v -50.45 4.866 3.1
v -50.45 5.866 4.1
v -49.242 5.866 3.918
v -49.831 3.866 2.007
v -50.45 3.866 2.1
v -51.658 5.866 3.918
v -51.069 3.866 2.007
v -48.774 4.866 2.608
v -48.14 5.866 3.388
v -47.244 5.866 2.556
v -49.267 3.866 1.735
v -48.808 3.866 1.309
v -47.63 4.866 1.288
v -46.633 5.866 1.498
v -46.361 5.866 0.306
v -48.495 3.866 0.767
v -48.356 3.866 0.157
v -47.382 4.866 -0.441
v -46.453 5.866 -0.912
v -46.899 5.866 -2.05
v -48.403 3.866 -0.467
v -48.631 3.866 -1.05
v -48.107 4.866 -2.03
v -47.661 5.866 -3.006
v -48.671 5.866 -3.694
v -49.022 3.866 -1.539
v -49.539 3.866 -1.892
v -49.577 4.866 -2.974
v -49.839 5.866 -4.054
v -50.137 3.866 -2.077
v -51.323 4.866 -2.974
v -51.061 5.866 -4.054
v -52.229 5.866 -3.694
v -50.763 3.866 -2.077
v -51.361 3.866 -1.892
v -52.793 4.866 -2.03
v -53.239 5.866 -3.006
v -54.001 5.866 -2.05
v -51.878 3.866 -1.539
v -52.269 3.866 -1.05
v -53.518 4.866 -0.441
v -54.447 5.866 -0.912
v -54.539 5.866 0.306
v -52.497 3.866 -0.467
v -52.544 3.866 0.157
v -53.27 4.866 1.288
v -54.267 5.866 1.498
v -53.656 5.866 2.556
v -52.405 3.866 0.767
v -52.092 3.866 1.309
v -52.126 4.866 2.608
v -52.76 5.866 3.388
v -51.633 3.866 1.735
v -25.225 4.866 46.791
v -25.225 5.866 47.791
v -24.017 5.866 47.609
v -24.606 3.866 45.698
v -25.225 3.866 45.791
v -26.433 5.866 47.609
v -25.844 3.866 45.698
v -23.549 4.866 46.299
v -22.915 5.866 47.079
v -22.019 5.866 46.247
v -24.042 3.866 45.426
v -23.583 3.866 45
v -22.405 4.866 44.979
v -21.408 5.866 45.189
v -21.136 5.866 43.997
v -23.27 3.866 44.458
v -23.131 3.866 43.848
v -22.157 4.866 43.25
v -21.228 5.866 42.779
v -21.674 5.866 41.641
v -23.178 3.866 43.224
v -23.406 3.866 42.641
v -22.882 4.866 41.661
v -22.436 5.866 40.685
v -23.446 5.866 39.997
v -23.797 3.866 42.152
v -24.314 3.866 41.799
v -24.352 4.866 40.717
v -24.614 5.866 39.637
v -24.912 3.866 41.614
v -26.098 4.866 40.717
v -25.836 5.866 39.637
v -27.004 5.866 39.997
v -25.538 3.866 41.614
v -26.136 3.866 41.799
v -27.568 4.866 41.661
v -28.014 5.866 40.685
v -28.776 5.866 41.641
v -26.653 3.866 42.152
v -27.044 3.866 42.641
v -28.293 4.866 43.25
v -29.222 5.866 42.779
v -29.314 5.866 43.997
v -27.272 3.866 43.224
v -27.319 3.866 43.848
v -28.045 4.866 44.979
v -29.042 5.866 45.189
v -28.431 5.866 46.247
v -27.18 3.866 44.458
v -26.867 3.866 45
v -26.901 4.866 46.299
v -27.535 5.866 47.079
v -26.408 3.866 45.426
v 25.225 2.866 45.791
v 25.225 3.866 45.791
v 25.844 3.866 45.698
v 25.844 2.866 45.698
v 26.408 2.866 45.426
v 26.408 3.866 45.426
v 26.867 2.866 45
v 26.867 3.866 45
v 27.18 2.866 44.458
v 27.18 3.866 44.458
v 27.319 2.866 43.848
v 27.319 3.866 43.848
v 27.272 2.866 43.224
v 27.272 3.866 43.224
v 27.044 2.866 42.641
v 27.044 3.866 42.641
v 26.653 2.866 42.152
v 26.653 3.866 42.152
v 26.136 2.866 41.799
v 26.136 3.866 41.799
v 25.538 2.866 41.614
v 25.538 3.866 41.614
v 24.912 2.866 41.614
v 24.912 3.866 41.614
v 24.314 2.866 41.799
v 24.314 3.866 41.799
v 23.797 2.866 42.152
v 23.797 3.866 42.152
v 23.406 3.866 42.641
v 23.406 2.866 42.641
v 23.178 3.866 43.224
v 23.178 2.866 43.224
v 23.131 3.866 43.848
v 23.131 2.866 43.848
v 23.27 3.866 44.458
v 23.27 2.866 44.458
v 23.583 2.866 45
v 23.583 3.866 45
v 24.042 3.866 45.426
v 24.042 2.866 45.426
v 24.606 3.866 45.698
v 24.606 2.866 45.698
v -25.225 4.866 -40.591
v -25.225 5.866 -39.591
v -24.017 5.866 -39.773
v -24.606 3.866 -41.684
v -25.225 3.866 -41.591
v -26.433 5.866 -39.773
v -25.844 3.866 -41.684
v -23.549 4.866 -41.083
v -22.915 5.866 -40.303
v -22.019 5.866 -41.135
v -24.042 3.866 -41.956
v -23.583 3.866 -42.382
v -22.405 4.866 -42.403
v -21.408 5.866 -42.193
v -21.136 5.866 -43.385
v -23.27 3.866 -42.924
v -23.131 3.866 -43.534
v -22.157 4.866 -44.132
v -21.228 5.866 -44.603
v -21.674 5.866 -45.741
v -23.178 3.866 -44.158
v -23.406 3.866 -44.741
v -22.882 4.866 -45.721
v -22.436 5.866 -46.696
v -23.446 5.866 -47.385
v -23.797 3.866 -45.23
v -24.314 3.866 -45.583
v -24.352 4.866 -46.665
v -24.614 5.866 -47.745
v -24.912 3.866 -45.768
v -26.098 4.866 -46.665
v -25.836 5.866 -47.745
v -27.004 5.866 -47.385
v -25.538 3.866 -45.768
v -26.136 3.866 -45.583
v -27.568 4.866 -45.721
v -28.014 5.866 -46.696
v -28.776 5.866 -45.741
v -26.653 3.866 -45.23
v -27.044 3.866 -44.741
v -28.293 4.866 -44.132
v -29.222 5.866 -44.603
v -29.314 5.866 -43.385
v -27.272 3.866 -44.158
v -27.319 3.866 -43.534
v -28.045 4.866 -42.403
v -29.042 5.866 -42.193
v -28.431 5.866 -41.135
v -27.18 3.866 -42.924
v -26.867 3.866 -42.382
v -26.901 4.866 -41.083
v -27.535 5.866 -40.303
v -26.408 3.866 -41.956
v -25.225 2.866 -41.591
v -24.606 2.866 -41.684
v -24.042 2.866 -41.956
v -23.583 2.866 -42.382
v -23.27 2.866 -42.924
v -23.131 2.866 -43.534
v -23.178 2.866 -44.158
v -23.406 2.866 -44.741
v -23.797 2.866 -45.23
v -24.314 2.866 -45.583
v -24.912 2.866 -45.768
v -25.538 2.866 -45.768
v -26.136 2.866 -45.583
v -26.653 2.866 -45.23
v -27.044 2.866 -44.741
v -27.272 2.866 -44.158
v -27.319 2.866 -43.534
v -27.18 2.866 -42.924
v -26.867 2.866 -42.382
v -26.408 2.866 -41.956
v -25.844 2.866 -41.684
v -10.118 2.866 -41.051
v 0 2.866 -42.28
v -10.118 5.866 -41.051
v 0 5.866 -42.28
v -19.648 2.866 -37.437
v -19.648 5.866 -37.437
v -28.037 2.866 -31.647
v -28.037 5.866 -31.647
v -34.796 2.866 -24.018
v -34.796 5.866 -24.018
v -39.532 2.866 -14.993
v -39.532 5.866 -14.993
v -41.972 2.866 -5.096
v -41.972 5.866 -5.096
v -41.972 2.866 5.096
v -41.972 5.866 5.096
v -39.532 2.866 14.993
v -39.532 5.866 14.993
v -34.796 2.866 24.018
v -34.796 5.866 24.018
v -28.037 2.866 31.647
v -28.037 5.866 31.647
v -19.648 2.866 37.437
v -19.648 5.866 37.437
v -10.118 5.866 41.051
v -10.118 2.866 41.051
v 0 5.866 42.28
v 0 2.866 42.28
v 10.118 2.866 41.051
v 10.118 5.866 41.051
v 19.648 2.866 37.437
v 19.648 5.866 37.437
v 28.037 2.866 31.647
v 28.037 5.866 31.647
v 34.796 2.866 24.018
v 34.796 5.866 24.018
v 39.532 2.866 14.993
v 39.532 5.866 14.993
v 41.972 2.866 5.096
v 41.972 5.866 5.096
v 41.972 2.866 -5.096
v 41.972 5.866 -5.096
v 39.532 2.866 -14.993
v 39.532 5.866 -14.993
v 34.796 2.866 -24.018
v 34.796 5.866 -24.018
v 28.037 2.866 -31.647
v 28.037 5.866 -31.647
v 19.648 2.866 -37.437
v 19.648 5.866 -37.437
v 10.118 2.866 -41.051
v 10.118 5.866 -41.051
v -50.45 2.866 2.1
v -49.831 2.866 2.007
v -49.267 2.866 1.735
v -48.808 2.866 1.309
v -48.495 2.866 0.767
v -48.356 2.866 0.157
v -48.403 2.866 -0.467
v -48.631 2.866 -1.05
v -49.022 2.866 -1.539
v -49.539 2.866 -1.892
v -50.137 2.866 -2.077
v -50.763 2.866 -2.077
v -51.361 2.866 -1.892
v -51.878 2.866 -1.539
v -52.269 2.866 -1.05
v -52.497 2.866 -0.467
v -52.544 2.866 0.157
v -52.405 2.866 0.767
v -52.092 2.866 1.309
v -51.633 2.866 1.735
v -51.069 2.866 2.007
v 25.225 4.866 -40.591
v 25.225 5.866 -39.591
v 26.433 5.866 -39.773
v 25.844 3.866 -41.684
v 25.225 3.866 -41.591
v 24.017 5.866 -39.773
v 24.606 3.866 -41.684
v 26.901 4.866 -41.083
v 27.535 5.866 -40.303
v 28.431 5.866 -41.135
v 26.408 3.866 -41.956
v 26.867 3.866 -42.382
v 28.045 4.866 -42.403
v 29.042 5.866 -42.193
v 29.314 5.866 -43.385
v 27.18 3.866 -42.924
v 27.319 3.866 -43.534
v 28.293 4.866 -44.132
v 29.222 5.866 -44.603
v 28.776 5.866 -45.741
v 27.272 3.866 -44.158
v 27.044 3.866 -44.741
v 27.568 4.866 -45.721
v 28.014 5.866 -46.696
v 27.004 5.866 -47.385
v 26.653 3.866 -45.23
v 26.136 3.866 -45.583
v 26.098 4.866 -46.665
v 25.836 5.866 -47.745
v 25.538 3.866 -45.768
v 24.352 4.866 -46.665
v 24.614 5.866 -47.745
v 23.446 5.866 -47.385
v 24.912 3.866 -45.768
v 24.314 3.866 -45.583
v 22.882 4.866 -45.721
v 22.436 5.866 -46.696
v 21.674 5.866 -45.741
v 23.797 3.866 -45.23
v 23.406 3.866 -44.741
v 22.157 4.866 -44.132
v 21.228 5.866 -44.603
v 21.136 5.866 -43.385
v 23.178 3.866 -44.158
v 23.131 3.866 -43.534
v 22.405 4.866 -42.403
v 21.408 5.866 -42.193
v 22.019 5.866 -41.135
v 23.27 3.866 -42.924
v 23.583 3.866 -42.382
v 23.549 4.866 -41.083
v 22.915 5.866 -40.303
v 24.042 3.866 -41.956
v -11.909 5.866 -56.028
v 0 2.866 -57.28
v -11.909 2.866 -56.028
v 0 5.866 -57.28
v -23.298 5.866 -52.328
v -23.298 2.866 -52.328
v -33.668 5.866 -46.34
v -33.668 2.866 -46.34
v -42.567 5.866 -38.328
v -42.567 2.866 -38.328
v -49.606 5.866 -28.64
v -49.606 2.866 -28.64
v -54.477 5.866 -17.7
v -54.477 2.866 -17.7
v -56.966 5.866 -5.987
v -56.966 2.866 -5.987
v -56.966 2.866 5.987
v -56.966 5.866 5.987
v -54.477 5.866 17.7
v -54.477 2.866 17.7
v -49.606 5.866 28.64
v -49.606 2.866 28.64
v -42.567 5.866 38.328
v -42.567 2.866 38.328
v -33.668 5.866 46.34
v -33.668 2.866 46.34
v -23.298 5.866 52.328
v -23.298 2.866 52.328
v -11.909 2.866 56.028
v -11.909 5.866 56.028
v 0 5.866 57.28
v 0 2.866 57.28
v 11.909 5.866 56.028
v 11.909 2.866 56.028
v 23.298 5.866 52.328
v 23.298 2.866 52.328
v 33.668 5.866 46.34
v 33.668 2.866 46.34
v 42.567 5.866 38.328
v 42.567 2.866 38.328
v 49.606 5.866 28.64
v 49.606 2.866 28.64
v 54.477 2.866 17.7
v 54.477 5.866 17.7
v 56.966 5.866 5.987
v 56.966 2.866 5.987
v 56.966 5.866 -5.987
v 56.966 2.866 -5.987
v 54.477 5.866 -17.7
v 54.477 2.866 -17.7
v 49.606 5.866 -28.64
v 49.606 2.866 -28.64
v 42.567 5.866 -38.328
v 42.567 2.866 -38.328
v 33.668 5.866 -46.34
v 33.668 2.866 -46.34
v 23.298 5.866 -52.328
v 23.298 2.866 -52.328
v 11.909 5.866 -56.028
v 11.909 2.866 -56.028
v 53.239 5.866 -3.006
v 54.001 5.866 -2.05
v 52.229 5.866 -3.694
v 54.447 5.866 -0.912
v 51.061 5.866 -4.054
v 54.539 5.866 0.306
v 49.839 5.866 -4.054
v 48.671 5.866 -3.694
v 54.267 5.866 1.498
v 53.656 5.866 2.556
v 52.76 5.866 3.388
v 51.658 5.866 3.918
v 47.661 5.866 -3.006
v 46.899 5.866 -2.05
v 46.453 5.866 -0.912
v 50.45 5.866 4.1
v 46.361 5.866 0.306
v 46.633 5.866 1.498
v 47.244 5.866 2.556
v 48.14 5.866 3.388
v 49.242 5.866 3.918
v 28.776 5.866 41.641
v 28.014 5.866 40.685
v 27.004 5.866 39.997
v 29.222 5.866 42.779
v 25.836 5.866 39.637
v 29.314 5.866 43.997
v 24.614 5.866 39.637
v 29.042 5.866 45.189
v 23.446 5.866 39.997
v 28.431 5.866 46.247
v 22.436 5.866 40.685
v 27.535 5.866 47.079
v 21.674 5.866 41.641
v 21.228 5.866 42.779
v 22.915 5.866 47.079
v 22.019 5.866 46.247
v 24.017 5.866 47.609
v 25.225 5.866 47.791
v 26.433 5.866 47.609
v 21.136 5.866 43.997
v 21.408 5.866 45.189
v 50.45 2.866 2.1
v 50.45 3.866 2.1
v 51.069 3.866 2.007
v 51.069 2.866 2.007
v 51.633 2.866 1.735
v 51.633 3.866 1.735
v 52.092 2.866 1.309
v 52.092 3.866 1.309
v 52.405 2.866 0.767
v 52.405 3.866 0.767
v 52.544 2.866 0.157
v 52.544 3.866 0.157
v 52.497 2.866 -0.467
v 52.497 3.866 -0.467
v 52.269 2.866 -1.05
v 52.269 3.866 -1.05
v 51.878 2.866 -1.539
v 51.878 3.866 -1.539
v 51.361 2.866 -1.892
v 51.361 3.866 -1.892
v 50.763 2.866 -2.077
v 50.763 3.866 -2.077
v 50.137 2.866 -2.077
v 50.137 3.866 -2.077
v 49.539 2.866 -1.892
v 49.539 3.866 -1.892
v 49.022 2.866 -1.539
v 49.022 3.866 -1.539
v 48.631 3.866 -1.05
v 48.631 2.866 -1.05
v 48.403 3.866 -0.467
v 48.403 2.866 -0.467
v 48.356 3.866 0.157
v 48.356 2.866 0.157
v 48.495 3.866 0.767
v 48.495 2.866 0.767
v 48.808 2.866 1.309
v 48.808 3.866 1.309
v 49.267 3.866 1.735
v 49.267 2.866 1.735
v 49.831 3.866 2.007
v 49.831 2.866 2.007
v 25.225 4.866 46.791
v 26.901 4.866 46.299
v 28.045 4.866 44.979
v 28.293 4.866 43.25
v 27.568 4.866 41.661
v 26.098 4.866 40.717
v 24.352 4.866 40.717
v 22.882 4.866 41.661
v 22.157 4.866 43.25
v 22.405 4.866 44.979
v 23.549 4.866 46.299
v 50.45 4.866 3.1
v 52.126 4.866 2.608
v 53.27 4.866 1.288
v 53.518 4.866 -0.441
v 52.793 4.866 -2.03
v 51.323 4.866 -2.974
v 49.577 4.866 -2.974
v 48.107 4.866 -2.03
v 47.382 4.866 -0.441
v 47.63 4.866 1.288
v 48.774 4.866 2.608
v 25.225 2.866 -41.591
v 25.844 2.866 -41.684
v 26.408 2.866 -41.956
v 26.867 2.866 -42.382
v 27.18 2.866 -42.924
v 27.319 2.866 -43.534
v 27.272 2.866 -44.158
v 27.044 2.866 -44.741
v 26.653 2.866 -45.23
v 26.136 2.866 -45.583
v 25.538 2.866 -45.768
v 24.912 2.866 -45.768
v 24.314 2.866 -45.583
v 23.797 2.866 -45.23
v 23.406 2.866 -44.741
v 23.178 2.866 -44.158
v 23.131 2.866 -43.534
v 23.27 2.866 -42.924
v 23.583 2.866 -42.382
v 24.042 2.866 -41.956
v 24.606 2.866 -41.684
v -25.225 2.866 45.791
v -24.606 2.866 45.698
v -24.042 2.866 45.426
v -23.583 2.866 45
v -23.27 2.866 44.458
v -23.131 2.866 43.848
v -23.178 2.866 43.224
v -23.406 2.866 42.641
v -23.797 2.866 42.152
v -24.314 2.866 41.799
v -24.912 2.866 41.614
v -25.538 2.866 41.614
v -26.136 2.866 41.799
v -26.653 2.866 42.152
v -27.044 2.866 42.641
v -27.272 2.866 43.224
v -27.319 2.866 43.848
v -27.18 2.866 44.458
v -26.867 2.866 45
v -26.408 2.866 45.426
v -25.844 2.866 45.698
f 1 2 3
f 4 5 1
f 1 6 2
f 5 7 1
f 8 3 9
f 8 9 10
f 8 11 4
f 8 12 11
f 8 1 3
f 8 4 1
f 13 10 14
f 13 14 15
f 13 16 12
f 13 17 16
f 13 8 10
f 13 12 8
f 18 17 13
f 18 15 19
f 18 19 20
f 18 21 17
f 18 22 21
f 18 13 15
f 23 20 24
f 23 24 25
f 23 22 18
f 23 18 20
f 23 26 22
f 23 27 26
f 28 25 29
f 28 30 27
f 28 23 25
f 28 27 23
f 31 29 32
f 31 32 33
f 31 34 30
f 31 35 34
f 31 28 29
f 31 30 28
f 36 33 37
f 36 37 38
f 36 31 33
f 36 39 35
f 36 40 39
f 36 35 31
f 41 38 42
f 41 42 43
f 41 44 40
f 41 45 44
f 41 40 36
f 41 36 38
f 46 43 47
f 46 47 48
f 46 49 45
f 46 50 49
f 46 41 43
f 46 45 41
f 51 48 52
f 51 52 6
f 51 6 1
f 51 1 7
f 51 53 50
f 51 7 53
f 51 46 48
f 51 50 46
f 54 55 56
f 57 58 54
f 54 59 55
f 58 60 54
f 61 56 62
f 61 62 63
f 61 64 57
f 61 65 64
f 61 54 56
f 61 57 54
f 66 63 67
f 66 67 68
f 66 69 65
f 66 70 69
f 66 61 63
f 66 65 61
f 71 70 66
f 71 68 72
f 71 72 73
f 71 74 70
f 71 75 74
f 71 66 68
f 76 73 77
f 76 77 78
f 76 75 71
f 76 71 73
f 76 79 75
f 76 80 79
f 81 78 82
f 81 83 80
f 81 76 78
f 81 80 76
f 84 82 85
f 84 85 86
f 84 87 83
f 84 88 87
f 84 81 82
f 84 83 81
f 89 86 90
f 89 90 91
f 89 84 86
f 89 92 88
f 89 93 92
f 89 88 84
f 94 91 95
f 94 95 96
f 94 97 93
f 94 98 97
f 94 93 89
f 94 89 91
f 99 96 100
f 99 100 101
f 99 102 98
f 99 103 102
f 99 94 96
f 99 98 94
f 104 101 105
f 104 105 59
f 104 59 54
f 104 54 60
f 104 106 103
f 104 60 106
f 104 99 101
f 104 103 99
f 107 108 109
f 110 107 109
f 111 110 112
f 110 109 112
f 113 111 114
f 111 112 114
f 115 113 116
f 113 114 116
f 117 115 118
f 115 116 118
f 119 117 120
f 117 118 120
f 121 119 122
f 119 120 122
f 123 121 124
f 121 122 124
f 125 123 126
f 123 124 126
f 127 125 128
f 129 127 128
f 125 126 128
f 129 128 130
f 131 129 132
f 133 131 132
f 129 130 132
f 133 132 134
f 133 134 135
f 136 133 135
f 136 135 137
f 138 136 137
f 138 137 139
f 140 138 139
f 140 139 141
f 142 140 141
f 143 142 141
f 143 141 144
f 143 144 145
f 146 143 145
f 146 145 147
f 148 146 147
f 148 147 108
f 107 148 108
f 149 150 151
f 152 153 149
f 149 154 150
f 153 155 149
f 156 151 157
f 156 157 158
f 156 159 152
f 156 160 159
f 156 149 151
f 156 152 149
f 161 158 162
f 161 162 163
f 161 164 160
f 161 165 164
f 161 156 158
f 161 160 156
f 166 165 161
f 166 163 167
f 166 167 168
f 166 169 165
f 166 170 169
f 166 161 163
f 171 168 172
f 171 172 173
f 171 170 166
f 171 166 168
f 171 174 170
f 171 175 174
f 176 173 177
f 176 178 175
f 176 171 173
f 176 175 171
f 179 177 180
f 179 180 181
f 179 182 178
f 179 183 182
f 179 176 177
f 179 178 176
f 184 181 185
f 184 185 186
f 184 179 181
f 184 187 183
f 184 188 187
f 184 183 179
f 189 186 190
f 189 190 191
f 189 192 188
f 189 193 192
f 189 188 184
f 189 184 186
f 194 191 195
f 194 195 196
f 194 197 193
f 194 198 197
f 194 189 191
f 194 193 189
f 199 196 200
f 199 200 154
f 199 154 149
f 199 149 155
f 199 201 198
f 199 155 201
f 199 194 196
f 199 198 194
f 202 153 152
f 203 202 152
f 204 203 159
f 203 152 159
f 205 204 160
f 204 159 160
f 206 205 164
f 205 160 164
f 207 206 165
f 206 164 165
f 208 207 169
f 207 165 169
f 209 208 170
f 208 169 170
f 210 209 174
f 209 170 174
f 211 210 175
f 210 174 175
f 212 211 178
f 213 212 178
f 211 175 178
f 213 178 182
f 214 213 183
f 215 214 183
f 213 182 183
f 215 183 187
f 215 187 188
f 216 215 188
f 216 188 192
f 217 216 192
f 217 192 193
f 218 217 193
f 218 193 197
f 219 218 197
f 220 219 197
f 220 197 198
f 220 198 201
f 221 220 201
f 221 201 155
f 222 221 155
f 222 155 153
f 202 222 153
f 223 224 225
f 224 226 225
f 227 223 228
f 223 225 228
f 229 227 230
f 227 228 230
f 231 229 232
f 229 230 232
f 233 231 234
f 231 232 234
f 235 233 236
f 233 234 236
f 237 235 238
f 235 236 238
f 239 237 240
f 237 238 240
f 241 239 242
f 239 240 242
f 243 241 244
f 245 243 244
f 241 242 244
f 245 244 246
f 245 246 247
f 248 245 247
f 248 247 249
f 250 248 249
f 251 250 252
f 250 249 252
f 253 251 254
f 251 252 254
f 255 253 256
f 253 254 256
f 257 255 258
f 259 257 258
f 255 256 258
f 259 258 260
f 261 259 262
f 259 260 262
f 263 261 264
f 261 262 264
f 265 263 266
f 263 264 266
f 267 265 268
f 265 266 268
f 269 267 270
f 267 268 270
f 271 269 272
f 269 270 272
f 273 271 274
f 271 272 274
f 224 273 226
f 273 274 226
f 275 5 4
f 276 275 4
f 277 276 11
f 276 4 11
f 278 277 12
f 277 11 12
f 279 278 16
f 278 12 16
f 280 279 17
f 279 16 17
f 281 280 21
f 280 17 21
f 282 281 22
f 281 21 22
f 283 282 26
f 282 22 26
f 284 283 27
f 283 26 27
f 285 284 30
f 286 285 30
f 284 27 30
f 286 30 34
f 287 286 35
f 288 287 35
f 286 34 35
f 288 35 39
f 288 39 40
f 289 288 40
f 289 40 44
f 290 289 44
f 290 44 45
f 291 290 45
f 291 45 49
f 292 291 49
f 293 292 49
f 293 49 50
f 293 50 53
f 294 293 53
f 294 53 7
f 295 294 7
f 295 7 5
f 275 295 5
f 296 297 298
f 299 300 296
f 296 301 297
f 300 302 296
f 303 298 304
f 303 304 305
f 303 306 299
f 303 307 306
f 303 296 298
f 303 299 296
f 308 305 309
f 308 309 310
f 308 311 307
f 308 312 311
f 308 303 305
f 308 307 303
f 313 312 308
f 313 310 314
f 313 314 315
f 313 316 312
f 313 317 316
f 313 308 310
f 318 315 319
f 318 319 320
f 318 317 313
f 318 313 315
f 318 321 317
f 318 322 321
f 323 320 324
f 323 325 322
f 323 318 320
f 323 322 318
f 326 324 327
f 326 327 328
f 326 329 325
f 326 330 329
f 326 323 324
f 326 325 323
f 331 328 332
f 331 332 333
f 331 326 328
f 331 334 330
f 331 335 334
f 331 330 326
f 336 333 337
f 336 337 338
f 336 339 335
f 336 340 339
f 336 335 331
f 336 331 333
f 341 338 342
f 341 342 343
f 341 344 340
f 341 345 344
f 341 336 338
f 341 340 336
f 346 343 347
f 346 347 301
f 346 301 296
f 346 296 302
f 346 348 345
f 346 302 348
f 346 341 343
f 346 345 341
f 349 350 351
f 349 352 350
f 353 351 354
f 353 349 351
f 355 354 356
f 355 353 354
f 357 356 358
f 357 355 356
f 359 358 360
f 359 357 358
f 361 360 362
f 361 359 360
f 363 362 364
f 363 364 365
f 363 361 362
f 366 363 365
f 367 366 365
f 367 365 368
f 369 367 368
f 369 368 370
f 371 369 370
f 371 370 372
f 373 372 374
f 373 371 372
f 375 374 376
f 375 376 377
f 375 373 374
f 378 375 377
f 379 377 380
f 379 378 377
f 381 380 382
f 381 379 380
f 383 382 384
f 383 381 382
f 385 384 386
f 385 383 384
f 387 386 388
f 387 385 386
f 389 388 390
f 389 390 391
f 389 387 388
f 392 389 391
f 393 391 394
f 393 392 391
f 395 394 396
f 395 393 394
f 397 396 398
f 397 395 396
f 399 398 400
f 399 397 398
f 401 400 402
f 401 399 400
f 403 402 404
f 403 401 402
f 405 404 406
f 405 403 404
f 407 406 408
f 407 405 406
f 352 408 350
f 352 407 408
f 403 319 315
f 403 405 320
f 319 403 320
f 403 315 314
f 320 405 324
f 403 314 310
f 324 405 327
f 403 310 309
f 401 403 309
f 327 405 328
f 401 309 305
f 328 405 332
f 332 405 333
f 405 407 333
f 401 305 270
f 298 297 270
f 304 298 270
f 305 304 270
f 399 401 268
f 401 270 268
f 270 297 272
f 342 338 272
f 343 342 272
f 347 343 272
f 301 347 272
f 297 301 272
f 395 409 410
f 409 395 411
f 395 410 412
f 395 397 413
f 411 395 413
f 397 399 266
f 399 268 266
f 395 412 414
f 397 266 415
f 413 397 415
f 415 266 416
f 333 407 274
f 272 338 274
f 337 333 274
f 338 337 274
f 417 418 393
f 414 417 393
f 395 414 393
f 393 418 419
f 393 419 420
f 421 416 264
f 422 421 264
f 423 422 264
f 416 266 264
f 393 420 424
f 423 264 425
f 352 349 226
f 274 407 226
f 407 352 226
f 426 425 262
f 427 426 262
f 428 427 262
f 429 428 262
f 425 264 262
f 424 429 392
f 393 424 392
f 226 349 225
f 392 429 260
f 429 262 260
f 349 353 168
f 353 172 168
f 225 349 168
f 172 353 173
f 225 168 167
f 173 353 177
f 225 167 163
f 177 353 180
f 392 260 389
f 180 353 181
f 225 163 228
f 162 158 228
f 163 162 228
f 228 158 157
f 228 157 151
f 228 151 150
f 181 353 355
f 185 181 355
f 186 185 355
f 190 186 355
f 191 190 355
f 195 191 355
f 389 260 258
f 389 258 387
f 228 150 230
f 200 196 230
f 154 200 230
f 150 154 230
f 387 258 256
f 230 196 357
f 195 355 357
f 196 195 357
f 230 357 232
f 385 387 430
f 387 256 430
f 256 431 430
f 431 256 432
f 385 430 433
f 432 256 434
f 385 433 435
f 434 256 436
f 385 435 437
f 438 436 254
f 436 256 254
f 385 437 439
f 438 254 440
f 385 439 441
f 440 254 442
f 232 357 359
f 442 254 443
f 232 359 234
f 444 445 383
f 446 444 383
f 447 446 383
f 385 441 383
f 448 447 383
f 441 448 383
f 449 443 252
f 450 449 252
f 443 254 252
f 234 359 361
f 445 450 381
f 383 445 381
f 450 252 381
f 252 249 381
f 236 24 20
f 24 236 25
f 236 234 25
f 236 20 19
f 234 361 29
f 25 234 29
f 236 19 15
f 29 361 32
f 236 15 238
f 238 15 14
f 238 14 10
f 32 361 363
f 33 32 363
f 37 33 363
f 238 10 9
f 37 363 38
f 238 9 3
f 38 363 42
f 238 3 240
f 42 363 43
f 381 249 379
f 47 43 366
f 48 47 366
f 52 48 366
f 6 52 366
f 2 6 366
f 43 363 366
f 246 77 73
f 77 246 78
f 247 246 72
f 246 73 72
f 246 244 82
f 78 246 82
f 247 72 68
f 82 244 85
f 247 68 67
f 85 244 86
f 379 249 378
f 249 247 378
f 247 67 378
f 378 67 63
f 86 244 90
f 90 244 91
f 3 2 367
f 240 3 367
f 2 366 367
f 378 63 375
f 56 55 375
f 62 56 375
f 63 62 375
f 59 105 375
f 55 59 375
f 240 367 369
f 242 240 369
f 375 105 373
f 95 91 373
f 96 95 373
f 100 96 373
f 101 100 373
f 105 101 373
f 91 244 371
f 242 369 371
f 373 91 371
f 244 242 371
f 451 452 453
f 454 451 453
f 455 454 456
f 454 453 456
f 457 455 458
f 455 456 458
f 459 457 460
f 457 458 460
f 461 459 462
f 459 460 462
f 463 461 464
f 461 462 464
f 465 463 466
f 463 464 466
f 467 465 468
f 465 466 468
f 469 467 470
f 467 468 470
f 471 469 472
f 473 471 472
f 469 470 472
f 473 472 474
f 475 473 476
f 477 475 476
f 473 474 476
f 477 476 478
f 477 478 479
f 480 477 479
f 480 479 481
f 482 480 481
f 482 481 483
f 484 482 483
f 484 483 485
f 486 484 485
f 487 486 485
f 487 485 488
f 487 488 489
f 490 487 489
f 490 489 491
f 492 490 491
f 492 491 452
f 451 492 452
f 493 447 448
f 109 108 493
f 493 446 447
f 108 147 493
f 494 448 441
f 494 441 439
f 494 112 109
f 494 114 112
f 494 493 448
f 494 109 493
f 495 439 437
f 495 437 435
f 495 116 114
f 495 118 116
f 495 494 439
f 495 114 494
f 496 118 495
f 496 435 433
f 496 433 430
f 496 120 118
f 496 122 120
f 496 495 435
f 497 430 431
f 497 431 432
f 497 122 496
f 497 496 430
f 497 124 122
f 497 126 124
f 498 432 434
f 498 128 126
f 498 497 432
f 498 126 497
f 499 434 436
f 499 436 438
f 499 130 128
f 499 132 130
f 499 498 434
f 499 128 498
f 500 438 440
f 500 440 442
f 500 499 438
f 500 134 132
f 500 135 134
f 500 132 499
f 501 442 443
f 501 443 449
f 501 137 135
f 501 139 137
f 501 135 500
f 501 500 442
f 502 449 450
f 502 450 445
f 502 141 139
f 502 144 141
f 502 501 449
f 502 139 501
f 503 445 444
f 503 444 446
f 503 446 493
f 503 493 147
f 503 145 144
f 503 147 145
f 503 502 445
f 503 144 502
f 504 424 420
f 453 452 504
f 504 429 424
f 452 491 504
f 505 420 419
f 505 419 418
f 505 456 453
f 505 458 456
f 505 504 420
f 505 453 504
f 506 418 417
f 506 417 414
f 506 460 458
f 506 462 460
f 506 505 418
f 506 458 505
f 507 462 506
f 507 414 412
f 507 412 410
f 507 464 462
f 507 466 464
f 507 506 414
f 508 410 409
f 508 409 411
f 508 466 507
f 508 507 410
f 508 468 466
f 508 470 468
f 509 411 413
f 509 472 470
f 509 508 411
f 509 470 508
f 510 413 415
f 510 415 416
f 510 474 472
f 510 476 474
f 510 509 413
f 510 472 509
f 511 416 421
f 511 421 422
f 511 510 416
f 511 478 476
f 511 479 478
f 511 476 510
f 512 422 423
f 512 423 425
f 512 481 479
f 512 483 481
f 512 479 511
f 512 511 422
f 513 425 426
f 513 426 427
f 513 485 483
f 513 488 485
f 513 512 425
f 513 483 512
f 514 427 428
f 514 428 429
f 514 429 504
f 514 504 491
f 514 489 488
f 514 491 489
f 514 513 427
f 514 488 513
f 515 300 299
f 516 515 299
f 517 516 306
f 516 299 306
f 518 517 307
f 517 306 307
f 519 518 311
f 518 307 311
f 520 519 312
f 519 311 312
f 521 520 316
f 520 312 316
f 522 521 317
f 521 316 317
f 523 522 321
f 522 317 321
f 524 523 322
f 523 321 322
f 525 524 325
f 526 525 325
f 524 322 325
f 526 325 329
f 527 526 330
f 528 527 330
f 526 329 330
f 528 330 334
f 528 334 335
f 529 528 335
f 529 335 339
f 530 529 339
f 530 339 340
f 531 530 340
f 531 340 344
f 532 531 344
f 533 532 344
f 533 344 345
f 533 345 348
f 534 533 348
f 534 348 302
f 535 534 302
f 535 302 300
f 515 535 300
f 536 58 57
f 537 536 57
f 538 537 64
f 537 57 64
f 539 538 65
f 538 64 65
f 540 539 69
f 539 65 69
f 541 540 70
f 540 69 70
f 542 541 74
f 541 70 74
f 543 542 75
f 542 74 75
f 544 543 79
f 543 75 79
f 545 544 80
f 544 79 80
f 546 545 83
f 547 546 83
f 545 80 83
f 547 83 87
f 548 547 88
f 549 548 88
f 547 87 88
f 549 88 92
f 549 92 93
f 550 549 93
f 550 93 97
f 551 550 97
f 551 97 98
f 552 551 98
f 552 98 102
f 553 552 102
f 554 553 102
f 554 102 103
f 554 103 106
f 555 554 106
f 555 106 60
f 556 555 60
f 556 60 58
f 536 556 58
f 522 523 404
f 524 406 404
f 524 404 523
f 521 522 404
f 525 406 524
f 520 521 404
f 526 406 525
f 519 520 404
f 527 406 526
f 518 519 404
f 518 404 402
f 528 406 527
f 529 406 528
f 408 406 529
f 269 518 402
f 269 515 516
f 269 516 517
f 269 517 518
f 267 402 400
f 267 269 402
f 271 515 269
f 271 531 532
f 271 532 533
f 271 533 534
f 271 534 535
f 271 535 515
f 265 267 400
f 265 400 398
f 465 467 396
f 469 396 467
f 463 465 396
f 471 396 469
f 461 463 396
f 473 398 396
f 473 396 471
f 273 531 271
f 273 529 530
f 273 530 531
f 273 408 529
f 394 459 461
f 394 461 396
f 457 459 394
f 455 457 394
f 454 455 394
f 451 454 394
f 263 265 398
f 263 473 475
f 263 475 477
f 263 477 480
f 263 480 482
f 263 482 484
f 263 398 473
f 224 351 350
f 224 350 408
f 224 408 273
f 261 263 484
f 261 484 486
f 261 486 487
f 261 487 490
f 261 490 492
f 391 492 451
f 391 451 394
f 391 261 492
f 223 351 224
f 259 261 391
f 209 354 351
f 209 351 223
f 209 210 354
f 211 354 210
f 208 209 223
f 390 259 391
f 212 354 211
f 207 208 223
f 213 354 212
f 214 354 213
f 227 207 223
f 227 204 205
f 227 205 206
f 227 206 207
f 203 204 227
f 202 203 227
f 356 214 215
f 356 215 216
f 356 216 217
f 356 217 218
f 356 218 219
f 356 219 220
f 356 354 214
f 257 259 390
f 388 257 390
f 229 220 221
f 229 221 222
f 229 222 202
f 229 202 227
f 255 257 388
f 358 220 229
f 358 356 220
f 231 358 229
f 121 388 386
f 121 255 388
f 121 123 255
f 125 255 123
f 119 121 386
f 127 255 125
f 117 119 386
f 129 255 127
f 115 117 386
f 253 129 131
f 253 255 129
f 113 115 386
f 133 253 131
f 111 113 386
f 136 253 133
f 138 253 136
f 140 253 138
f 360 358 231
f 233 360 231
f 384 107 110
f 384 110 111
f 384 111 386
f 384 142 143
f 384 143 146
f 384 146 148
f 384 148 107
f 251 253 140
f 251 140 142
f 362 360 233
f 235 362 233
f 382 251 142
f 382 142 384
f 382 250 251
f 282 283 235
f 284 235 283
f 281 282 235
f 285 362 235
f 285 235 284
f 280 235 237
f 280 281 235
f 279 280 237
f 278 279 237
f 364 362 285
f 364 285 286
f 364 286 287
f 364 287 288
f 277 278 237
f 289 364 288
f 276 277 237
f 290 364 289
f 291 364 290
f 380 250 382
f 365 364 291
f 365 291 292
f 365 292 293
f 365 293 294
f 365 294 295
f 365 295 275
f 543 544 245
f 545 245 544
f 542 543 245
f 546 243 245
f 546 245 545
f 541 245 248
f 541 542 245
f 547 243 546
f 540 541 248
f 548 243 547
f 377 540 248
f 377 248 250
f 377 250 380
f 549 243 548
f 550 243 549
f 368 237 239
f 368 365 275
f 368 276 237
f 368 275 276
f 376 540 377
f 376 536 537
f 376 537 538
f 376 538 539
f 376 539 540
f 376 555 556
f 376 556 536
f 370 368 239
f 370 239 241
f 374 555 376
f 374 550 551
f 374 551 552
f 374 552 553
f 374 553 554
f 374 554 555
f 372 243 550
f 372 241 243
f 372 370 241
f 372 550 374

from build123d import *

# Parameters (mm, degrees)
SKETCH_1_W          = 15
SKETCH_1_H          = 3
SKETCH_2_R          = 2.1
CUT_EXTRUDE_1_DEPTH = 10
CHAMFER_1_SIZE      = 2


with BuildPart() as part:
    # 草图1 → 旋转1 (revolve)
    with BuildSketch(Plane.XY, mode=Mode.PRIVATE) as revolve_1_sk:
        with Locations((49.78, 4.365902373)):
            Rectangle(SKETCH_1_W, SKETCH_1_H)
    revolve(revolve_1_sk.sketch.rotate(Axis((0, 0, 0), (0, 1, 0)), 90), axis=Axis((0, 0, 0), (0, 1, 0)))

    # 草图2 → 切除-拉伸1 (cut)
    with BuildSketch(Plane(origin=(0, 5.865902373, 0), x_dir=(1, 0, 0), z_dir=(0, 1, 0))):
        with Locations(Location((-50.45, 0, 0), (0, 0, 270))):
            Circle(SKETCH_2_R)
        with Locations(Location((-25.225, 43.690981621, 0), (0, 0, 270))):
            Circle(SKETCH_2_R)
        with Locations(Location((25.225, 43.690981621, 0), (0, 0, 270))):
            Circle(SKETCH_2_R)
        with Locations(Location((50.45, 0, 0), (0, 0, 270))):
            Circle(SKETCH_2_R)
        with Locations(Location((25.225, -43.690981621, 0), (0, 0, 270))):
            Circle(SKETCH_2_R)
        with Locations(Location((-25.225, -43.690981621, 0), (0, 0, 270))):
            Circle(SKETCH_2_R)
    extrude(amount=-CUT_EXTRUDE_1_DEPTH, mode=Mode.SUBTRACT)

    # 倒角1
    chamfer_1_edges = [part.edges().sort_by_distance(p)[0] for p in [
        (-50.45, 5.865902373, -2.1),
        (-25.225, 5.865902373, 41.590981621),
        (25.225, 5.865902373, 41.590981621),
        (50.45, 5.865902373, -2.1),
        (25.225, 5.865902373, -45.790981621),
        (-25.225, 5.865902373, -45.790981621),
    ]]
    chamfer(chamfer_1_edges, length=CHAMFER_1_SIZE)


solid = part.part
